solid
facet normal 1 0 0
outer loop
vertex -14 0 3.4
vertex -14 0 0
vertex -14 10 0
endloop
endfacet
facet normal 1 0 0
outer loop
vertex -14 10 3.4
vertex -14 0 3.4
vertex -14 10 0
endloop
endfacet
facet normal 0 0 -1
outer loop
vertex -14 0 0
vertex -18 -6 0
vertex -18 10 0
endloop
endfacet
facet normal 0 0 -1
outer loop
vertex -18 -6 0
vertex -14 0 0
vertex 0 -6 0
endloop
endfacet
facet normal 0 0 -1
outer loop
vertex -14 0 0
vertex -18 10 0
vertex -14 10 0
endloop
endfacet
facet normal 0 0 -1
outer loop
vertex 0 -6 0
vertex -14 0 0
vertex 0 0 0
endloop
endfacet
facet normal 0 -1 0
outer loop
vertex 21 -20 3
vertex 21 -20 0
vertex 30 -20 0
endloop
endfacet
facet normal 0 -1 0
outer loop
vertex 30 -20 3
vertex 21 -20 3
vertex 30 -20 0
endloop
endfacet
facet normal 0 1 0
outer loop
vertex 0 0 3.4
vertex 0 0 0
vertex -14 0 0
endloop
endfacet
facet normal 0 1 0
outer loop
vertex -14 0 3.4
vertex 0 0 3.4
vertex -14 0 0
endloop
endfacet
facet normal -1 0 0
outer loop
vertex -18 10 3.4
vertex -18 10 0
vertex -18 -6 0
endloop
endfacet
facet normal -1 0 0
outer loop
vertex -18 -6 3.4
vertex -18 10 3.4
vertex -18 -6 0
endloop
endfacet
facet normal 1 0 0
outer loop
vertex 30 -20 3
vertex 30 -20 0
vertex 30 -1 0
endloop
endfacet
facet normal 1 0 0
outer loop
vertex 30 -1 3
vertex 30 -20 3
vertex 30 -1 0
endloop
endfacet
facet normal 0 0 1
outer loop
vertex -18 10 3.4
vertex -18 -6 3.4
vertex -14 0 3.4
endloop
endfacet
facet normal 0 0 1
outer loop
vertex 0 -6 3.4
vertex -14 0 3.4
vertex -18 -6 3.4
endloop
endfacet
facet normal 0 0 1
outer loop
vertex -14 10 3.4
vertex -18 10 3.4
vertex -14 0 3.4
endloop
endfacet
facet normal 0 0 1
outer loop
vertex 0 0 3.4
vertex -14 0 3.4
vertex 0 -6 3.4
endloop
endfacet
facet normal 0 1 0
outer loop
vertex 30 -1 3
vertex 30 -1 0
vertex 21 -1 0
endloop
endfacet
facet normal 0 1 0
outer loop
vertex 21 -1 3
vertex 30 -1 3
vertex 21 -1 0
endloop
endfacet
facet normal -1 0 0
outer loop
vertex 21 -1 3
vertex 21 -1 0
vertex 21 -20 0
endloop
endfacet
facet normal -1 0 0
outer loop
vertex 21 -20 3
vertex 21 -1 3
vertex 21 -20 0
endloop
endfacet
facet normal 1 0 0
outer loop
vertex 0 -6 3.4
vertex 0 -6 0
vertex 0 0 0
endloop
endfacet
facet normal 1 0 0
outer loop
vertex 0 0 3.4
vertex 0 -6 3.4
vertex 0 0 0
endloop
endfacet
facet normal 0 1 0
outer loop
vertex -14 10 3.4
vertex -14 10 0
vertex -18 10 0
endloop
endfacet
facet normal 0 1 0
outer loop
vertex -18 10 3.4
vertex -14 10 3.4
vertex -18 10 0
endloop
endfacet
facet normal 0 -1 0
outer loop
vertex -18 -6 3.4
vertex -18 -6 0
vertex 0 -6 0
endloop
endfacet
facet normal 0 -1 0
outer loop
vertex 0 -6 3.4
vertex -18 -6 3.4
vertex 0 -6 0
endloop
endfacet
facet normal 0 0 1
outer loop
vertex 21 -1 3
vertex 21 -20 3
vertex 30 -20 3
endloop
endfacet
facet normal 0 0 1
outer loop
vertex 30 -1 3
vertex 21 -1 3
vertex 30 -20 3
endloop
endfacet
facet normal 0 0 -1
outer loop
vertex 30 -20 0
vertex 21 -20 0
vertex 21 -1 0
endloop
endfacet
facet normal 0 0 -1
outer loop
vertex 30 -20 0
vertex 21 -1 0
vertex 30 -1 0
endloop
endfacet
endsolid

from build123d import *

# Parameters (mm, degrees)
F1_DEPTH = 3.4
F2_DEPTH = 3
F0_W     = 9
F0_H     = 2.456613
F3_DEPTH = 3


with BuildPart() as f1:
    # F0 (on Top) → F1 (new body)
    with BuildSketch(Plane.XY):
        Polygon((-18, 10), (-18, -6), (0, -6), (0, 0), (-14, 0), (-14, 10), align=None)
    extrude(amount=F1_DEPTH)


with BuildPart() as f2:
    # F0 (on Top) → F2 (new body)
    with BuildSketch(Plane.XY):
        Polygon((21, -15.038995), (30, -17.543387), (30, -1), (21, -1), align=None)
    extrude(amount=F2_DEPTH)

    # F0 (on Top) → F3 (join)
    with BuildSketch(Plane.XY):
        Polygon((21, -17.543387), (30, -17.543387), (21, -15.038995), align=None)
        with Locations((25.5, -18.771693)):
            Rectangle(F0_W, F0_H)
    extrude(amount=F3_DEPTH)


solid = Compound([f1.part, f2.part])
